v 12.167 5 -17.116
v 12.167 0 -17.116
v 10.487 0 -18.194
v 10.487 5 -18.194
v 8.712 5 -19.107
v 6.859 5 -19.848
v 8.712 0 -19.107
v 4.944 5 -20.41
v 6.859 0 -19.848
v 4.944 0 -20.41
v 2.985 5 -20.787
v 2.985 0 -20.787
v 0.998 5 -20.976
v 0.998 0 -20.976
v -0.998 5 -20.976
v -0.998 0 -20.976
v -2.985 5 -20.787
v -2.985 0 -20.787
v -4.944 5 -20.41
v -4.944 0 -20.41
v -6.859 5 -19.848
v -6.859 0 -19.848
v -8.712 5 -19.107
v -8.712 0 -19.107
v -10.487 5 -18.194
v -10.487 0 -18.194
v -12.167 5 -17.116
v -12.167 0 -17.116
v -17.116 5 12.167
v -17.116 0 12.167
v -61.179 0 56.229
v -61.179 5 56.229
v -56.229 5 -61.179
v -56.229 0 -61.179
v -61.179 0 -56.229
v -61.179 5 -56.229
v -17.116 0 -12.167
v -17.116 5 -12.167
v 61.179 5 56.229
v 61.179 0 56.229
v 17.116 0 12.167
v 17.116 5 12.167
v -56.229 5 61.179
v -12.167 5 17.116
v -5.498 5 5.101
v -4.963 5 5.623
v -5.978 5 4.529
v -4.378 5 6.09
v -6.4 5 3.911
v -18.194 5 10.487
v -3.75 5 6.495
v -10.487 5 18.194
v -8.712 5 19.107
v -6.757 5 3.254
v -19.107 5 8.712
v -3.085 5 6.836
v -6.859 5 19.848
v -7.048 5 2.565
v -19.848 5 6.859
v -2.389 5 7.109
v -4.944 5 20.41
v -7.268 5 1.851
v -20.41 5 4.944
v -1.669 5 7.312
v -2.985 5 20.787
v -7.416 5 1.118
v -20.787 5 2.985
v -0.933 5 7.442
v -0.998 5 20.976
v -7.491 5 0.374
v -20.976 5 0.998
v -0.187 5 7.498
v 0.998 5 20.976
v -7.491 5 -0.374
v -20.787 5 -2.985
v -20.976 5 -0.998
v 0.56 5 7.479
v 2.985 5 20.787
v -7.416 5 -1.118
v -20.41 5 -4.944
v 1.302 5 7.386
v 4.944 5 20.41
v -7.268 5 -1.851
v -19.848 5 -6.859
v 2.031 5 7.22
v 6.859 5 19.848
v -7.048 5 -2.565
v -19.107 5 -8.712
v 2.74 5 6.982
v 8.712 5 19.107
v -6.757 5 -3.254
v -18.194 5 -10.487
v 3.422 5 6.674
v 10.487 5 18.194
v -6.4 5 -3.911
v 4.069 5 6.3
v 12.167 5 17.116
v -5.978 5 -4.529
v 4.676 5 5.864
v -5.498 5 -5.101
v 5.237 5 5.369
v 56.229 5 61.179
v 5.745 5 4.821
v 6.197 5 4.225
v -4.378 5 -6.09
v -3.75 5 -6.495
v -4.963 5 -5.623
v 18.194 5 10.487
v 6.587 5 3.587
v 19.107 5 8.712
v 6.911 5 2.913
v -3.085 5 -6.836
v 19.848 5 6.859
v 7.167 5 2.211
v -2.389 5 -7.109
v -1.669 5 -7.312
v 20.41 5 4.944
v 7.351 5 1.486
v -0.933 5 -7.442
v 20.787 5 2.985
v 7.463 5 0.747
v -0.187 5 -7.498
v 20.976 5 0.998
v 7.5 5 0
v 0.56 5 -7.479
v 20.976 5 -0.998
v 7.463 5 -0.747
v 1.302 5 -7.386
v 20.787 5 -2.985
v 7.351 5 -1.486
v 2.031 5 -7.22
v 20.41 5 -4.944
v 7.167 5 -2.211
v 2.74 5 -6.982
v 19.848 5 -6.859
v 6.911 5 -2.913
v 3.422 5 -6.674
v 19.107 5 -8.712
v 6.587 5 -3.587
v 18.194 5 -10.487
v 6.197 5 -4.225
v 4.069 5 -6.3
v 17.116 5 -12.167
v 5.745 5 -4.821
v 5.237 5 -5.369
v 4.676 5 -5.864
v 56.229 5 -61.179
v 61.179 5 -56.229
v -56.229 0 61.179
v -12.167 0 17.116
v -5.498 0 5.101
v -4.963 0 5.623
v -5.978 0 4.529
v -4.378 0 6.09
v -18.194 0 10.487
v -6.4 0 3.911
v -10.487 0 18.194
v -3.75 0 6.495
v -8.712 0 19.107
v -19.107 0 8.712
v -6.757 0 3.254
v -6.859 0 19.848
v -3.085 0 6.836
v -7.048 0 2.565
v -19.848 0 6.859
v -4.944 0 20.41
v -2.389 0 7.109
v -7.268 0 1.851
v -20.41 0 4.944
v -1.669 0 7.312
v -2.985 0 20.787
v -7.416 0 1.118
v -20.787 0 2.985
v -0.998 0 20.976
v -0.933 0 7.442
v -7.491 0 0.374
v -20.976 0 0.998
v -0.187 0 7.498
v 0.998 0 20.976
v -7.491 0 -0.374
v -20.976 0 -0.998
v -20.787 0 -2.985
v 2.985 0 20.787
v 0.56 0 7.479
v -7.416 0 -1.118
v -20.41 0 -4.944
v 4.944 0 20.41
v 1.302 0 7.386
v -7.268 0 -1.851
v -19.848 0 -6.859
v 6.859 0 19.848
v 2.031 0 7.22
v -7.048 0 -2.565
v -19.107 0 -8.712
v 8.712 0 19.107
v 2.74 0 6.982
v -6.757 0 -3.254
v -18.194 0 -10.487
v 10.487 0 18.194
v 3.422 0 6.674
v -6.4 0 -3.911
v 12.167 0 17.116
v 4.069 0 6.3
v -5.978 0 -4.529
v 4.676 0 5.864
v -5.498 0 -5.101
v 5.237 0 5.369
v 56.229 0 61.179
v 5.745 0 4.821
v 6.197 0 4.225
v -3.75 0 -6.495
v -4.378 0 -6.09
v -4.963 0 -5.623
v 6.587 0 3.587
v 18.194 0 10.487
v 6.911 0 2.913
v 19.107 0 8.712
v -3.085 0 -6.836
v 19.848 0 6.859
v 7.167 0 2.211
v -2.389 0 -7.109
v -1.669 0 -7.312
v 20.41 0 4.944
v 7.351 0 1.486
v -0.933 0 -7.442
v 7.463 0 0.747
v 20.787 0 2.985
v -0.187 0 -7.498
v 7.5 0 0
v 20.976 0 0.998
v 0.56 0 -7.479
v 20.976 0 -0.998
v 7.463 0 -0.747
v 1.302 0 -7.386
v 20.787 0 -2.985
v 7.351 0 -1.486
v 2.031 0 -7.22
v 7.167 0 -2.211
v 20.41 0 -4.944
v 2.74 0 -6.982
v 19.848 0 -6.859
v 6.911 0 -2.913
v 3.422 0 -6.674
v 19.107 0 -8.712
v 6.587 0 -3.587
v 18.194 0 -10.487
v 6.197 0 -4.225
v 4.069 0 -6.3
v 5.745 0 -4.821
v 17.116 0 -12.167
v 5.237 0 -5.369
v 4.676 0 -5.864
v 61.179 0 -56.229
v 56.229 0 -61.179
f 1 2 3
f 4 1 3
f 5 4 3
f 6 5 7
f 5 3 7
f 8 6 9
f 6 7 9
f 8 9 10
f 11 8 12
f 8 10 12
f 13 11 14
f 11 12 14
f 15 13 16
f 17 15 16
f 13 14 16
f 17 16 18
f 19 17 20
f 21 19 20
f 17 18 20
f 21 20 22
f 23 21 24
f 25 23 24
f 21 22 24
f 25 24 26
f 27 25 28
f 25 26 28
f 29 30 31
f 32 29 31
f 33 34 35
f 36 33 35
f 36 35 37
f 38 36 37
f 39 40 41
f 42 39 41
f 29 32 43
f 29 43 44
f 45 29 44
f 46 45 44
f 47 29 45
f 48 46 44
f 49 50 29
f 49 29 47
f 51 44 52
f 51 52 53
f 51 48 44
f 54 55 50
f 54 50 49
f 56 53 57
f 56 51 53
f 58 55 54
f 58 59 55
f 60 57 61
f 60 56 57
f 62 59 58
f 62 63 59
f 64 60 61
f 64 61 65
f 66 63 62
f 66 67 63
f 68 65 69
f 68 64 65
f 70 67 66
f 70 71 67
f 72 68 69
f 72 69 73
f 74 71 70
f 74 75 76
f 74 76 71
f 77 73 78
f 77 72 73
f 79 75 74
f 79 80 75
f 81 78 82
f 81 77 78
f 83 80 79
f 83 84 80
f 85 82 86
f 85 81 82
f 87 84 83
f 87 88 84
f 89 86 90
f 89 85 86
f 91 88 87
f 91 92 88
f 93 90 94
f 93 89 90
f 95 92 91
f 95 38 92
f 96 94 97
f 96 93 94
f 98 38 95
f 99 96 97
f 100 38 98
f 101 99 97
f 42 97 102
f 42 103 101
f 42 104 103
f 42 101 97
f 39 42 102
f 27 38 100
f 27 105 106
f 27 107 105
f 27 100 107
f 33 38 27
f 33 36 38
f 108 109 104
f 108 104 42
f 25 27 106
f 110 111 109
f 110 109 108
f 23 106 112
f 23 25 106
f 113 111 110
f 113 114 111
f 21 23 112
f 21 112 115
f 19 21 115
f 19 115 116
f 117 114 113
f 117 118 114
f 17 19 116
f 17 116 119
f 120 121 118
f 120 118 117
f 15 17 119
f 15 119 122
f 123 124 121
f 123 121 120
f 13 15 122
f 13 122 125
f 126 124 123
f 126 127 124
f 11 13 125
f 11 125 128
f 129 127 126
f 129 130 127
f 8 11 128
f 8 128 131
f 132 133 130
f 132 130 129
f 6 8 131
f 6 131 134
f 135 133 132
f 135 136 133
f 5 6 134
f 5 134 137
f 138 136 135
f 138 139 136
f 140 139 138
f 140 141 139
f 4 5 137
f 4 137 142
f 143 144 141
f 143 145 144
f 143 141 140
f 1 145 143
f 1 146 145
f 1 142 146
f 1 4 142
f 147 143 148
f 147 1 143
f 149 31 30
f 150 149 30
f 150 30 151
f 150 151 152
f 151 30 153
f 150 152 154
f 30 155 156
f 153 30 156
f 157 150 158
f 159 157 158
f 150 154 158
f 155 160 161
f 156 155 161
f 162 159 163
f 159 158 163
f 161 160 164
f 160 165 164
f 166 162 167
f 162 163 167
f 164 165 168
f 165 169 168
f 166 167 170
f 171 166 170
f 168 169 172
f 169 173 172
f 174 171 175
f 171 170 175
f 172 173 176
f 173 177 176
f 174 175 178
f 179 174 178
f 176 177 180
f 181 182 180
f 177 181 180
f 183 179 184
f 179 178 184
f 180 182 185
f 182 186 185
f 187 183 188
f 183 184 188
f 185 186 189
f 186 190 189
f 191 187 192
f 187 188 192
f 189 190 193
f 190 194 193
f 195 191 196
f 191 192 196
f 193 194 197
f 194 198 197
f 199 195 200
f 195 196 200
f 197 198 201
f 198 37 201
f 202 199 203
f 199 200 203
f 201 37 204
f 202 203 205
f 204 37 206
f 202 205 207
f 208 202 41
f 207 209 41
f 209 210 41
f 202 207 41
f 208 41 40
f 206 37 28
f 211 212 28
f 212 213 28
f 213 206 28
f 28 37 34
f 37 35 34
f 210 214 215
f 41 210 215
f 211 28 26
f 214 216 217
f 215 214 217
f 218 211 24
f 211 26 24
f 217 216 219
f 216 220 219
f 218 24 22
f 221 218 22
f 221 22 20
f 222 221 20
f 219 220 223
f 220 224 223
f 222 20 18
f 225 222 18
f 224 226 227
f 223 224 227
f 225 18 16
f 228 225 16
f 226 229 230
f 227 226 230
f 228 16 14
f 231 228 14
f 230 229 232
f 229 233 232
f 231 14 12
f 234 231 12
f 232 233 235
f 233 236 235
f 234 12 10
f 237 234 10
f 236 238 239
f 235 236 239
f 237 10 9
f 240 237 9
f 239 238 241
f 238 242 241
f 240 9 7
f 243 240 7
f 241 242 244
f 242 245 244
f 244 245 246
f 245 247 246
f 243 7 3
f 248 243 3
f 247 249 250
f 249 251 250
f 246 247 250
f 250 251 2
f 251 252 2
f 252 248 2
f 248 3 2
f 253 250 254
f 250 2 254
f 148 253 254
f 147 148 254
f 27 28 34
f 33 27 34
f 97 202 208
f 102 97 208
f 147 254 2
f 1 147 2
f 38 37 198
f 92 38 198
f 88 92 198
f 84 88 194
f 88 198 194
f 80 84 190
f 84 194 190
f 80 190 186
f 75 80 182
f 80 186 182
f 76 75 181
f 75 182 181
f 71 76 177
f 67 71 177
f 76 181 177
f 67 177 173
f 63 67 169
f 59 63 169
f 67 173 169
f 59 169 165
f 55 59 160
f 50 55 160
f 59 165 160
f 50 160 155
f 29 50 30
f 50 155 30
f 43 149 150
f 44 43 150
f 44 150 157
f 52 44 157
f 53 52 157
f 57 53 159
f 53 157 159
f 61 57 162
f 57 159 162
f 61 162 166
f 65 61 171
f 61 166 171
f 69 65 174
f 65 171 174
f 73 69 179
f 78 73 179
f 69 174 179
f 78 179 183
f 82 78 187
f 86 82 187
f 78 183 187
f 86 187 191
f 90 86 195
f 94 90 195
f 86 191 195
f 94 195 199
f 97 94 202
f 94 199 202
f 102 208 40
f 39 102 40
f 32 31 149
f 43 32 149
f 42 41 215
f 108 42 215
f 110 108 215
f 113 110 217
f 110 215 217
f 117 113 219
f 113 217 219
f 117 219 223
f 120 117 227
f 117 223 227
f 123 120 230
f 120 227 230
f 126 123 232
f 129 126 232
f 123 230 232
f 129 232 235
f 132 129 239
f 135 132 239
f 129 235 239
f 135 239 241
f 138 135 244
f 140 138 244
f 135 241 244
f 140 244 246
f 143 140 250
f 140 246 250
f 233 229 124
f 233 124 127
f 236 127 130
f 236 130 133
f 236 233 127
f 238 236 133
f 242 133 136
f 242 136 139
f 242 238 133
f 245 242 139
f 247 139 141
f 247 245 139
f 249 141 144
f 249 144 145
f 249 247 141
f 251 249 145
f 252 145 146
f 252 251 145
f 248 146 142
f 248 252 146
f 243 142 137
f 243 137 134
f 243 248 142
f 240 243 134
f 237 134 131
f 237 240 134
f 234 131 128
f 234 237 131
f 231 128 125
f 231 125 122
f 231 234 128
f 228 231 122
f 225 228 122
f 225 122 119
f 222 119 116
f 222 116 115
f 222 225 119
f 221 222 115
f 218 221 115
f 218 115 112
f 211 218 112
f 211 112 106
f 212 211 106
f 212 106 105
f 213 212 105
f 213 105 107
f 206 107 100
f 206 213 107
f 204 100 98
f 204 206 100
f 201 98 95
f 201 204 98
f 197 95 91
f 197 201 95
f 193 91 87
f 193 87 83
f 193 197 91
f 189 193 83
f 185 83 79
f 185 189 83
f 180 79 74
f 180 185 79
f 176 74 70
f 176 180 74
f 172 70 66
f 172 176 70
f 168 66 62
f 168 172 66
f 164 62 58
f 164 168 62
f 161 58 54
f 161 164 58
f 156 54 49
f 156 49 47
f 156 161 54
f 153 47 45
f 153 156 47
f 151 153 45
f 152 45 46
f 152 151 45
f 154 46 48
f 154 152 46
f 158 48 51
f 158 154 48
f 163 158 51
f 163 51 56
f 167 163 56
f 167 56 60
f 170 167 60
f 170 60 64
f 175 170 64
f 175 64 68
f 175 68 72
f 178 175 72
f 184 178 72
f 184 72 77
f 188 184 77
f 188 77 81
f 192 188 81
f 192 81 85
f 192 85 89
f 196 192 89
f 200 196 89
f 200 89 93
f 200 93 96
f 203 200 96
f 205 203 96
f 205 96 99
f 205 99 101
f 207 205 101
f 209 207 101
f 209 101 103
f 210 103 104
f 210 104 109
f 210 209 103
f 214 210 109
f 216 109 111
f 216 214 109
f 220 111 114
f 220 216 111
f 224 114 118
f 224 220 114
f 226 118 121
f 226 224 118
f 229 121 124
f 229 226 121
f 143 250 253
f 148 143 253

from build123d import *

# Parameters (mm, degrees)
SKETCH_1_R      = 7.5
EXTRUDE_1_DEPTH = 5


with BuildPart() as part:
    # Эскиз1 → Бобышка-Вытянуть1 (new body)
    with BuildSketch(Plane(origin=(0, 0, 0), x_dir=(1, 0, 0), z_dir=(0, 1, 0))):
        with BuildLine():
            Line((-17.116424198, -12.16667673), (-61.179242059, -56.229494591))
            Line((-61.179242059, -56.229494591), (-56.229494591, -61.179242059))
            Line((-56.229494591, -61.179242059), (-12.16667673, -17.116424198))
            ThreePointArc((-12.16667673, -17.116424198), (0, -21), (12.16667673, -17.116424198))
            Line((12.16667673, -17.116424198), (56.229494591, -61.179242059))
            Line((56.229494591, -61.179242059), (61.179242059, -56.229494591))
            Line((61.179242059, -56.229494591), (17.116424198, -12.16667673))
            ThreePointArc((17.116424198, -12.16667673), (21, 0), (17.116424198, 12.16667673))
            Line((17.116424198, 12.16667673), (61.179242059, 56.229494591))
            Line((61.179242059, 56.229494591), (56.229494591, 61.179242059))
            Line((56.229494591, 61.179242059), (12.16667673, 17.116424198))
            ThreePointArc((12.16667673, 17.116424198), (0, 21), (-12.16667673, 17.116424198))
            Line((-12.16667673, 17.116424198), (-56.229494591, 61.179242059))
            Line((-56.229494591, 61.179242059), (-61.179242059, 56.229494591))
            Line((-61.179242059, 56.229494591), (-17.116424198, 12.16667673))
            ThreePointArc((-17.116424198, 12.16667673), (-21, 0), (-17.116424198, -12.16667673))
        make_face()
        Circle(SKETCH_1_R, mode=Mode.SUBTRACT)
    extrude(amount=EXTRUDE_1_DEPTH)


solid = part.part
